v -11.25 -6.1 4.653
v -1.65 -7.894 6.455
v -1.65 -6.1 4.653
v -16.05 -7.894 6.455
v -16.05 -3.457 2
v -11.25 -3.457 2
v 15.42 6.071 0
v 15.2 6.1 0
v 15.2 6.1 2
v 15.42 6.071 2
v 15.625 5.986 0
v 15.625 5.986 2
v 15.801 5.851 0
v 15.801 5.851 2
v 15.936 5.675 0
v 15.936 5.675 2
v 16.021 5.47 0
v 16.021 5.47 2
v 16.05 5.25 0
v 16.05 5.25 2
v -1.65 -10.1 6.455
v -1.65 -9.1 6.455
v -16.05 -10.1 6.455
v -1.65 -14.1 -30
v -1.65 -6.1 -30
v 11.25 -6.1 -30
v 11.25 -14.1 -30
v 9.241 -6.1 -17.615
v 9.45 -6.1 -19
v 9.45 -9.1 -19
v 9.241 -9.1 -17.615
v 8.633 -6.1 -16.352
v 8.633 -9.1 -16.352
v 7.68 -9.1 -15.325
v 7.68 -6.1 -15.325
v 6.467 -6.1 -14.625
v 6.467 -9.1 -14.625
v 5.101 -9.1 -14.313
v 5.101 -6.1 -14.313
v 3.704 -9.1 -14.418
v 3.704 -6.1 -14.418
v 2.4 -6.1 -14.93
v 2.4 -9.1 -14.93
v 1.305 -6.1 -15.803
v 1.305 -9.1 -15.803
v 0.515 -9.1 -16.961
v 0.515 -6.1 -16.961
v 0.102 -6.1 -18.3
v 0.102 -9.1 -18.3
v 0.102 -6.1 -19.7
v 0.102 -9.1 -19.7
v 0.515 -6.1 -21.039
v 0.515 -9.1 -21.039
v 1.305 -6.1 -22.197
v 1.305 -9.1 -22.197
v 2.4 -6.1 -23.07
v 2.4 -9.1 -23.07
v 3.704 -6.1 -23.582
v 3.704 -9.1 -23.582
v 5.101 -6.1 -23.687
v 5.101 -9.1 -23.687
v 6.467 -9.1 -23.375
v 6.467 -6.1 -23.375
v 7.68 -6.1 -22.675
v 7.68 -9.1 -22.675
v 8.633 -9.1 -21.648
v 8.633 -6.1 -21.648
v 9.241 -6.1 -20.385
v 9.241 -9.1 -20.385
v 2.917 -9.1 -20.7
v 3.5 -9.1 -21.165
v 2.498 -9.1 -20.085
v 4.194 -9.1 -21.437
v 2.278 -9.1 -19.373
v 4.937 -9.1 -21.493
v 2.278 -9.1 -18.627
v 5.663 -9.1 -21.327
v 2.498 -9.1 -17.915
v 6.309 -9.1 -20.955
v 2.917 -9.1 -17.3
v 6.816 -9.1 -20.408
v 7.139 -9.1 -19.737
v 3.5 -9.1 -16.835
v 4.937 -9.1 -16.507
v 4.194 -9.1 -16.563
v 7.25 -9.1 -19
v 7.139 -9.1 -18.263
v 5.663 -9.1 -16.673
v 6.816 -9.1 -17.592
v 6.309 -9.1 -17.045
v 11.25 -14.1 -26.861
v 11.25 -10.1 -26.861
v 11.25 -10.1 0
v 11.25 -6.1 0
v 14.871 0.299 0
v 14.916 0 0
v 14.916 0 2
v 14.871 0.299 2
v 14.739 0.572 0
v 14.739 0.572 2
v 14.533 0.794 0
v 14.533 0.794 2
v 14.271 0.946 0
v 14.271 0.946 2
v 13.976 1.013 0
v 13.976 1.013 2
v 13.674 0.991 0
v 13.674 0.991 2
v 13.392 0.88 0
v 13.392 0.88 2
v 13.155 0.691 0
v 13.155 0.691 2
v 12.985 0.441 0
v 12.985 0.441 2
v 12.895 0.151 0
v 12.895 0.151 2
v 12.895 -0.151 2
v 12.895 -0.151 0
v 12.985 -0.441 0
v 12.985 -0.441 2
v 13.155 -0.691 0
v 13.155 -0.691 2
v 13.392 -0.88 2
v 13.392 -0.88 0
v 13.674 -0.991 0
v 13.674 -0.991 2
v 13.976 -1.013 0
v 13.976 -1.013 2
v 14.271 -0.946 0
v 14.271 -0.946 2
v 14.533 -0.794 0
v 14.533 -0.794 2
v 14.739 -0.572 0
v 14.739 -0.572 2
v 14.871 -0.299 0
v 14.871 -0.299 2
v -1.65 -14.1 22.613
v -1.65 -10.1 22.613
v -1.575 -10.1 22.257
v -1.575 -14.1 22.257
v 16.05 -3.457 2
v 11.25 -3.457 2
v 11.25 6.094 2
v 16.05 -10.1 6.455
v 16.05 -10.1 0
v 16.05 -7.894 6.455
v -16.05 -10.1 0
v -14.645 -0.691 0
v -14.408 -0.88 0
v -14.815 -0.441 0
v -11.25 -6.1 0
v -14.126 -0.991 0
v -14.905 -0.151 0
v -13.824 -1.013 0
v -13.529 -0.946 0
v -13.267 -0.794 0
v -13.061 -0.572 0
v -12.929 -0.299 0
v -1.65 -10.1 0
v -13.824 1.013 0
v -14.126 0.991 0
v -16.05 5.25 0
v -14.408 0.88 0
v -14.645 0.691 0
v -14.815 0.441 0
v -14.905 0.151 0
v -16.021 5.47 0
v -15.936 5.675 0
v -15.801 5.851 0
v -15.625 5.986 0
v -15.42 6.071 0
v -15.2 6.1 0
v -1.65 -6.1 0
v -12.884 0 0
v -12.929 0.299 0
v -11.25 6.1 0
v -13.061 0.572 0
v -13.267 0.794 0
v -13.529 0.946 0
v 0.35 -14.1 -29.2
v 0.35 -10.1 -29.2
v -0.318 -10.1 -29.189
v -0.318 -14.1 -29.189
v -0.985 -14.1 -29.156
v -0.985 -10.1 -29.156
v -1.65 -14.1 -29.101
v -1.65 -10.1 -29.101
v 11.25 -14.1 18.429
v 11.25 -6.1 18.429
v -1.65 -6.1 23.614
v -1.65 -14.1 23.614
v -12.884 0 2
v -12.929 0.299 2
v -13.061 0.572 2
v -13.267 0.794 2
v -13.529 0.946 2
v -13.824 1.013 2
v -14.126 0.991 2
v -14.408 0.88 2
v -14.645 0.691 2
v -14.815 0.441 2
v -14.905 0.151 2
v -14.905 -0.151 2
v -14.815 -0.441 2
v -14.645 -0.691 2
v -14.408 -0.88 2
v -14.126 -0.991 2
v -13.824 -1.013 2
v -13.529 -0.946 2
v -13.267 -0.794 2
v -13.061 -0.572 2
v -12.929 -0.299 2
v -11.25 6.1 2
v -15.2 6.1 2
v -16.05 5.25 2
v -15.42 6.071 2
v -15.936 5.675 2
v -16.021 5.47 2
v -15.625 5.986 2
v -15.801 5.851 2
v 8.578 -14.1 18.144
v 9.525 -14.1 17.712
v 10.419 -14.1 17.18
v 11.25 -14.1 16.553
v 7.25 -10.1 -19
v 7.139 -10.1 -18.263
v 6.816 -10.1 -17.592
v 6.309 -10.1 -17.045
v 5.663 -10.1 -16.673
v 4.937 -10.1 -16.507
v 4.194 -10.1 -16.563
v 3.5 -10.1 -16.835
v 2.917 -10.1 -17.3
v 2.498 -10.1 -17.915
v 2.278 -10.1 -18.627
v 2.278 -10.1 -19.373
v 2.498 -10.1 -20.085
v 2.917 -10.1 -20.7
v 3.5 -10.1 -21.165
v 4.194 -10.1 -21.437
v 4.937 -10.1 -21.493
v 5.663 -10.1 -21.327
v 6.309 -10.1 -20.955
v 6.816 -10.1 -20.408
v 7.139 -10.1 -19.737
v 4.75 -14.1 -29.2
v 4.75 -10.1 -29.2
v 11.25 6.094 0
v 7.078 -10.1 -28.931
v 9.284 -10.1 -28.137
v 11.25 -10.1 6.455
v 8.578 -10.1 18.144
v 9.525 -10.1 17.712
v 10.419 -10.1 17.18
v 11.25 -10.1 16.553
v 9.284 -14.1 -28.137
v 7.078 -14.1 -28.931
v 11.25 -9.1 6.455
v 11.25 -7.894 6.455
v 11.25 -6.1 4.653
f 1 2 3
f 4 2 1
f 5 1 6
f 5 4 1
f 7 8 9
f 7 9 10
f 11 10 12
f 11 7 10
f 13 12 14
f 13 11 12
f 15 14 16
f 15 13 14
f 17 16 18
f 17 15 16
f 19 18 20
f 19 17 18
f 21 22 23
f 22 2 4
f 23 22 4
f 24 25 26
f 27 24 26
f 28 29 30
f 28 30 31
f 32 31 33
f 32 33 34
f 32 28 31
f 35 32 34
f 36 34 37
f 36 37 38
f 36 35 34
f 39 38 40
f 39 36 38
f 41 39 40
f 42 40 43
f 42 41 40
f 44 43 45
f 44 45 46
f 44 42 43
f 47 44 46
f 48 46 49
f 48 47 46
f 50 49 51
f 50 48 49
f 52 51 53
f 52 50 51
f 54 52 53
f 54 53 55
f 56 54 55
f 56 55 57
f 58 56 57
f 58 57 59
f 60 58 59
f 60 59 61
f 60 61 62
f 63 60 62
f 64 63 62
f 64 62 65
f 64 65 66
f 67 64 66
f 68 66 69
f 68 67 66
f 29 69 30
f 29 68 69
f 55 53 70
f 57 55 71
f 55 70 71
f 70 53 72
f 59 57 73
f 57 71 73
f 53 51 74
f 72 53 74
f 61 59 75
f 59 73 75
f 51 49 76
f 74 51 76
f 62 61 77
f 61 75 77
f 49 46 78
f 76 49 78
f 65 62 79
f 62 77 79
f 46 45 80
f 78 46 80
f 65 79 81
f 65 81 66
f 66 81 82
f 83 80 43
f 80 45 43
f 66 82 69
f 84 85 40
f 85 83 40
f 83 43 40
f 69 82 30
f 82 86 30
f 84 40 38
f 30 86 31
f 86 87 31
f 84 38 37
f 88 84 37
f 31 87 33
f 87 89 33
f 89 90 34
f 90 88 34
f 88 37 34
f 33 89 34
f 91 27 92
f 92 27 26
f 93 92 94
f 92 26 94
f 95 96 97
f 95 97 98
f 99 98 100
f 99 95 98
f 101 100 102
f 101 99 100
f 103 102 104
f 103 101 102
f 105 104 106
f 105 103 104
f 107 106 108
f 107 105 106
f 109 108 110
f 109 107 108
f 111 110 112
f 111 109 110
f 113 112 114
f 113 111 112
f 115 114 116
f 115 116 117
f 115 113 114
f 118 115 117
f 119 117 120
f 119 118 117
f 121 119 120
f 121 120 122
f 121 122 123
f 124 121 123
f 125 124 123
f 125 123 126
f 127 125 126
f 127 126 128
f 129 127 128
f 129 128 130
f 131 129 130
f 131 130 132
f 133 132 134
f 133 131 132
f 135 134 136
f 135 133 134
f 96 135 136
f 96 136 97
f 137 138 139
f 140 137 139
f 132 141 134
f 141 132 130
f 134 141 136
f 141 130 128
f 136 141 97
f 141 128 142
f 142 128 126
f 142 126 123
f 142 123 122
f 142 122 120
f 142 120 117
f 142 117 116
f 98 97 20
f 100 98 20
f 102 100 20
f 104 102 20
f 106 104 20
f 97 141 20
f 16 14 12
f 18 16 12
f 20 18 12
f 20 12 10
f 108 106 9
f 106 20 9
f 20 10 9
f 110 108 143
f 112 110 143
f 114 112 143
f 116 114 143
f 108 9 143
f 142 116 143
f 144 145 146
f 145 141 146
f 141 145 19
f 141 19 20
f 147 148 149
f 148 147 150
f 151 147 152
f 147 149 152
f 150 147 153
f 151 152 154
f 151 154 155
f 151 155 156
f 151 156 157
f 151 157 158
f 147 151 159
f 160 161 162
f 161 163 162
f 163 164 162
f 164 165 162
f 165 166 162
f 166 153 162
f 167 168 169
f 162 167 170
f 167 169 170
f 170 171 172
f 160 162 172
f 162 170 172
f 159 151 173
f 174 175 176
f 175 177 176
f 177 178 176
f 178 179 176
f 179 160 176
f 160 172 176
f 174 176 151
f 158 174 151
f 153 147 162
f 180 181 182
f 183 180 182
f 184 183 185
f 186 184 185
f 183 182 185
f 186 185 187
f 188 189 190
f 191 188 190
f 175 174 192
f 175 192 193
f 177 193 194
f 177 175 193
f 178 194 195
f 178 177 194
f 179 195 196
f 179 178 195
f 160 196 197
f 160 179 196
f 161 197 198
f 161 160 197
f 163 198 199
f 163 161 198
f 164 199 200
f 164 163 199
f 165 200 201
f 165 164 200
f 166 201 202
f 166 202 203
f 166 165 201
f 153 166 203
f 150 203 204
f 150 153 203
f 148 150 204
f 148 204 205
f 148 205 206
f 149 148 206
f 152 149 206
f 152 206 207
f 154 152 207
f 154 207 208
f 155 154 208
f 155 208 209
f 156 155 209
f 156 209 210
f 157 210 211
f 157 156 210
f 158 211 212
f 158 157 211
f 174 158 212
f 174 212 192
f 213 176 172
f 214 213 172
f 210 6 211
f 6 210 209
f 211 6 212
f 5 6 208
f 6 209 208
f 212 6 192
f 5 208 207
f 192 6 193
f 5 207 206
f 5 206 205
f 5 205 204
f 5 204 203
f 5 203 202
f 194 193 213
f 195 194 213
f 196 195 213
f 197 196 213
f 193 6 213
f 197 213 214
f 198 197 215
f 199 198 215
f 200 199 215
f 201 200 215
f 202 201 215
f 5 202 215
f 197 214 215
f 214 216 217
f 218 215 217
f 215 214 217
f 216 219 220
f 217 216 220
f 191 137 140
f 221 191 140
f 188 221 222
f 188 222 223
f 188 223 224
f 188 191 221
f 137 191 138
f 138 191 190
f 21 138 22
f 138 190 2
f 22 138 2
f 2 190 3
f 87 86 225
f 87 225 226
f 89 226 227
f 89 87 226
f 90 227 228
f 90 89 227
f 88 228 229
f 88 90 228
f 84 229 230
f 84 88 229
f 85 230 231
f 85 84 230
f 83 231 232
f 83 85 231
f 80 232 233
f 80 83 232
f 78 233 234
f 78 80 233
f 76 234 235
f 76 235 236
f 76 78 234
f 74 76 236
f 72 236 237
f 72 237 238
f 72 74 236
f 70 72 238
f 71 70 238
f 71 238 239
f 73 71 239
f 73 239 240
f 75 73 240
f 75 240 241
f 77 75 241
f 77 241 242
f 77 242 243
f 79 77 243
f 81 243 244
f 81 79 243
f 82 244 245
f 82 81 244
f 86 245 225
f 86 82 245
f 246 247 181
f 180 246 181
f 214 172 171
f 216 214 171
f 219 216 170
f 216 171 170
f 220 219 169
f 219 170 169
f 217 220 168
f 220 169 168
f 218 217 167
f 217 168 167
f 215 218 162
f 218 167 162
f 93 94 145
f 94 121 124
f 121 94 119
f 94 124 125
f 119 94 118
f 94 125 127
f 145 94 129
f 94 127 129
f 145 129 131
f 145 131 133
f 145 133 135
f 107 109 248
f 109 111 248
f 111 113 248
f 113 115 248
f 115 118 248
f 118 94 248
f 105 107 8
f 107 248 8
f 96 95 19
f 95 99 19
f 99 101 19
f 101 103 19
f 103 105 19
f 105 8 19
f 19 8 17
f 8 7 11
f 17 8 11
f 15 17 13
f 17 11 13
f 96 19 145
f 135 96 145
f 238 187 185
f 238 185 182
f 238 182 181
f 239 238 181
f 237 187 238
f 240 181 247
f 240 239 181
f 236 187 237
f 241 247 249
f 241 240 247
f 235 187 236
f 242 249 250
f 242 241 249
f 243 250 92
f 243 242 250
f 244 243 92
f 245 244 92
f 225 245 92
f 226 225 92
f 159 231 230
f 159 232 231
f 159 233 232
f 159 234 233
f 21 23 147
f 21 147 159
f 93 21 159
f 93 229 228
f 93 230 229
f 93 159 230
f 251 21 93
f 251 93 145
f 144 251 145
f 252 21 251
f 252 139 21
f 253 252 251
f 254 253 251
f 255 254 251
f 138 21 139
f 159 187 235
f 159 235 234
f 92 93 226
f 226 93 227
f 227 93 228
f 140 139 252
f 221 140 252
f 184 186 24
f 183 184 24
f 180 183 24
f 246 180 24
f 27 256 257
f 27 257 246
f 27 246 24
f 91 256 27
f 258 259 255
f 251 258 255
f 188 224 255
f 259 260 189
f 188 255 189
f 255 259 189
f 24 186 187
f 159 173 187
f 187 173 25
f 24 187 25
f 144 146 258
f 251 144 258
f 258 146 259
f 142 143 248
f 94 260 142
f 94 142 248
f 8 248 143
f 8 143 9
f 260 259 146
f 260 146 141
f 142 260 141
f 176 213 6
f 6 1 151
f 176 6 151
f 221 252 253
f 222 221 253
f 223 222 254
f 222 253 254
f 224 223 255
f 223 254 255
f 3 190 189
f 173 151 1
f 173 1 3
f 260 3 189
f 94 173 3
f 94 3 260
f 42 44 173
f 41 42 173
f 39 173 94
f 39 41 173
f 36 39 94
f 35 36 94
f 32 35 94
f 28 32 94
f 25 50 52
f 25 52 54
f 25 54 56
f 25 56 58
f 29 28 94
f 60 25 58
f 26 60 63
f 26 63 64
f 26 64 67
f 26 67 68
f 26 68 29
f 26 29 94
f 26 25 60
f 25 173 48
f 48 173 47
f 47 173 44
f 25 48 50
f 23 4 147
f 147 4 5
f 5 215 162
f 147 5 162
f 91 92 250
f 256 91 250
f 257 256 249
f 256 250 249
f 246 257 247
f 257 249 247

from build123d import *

# Parameters (mm, degrees)
SKETCH1_R           = 1.016
BOSS_EXTRUDE1_DEPTH = 2
SKETCH2_R           = 4.7
BOSS_EXTRUDE2_DEPTH = 3
BOSS_EXTRUDE5_DEPTH = 8
BOSS_EXTRUDE6_START = -27.3
BOSS_EXTRUDE6_DEPTH = 32.1
SKETCH4_W           = 22.5
SKETCH4_H           = 14.127681706
CUT_EXTRUDE1_DEPTH  = 7
FILLET1_R           = 0.5
SKETCH5_R           = 2.5
BOSS_EXTRUDE7_DEPTH = 1
SKETCH6_W           = 5.313656685
SKETCH6_H           = 4.599259183
SKETCH6_W_2         = 16.163165117
SKETCH6_H_2         = 5.344557169
CUT_EXTRUDE2_DEPTH  = 5


with BuildPart() as part:
    # Sketch1 → Boss-Extrude1 (new body)
    # profile 1 of 4: a face of its own
    with BuildSketch(Plane.XY):
        with BuildLine():
            Line((-16.05, 5.25), (-16.05, -5.25))
            ThreePointArc((-16.05, -5.25), (-15.801040764, -5.851040764), (-15.2, -6.1))
            Line((-15.2, -6.1), (-11.25, -6.1))
            Line((-11.25, -6.1), (-11.25, 6.1))
            Line((-11.25, 6.1), (-15.2, 6.1))
            ThreePointArc((-15.2, 6.1), (-15.801040764, 5.851040764), (-16.05, 5.25))
        make_face()
        with Locations((-13.9, 0)):
            Circle(SKETCH1_R, mode=Mode.SUBTRACT)
    # profile 2 of 4: a face of its own
    with BuildSketch(Plane.XY):
        with BuildLine():
            Line((16.05, 5.25), (16.05, -5.25))
            ThreePointArc((16.05, -5.25), (15.801040764, -5.851040764), (15.2, -6.1))
            Line((15.2, -6.1), (11.25, -6.1))
            Line((11.25, -6.1), (11.25, 6.094097151))
            Line((11.25, 6.094097151), (15.2, 6.1))
            ThreePointArc((15.2, 6.1), (15.801040764, 5.851040764), (16.05, 5.25))
        make_face()
        with Locations((13.9, 0)):
            Circle(SKETCH1_R, mode=Mode.SUBTRACT)
    # profile 3 of 4: a face of its own
    with BuildSketch(Plane.XY):
        with BuildLine():
            ThreePointArc((15.2, -6.1), (15.801040764, -5.851040764), (16.05, -5.25))
            Line((16.05, -5.25), (16.05, -6.1))
            Line((16.05, -6.1), (15.2, -6.1))
        make_face()
    # profile 4 of 4: a face of its own
    with BuildSketch(Plane.XY):
        with BuildLine():
            ThreePointArc((-16.05, -5.25), (-15.801040764, -5.851040764), (-15.2, -6.1))
            Line((-15.2, -6.1), (-16.05, -6.1))
            Line((-16.05, -6.1), (-16.05, -5.25))
        make_face()
    extrude(amount=BOSS_EXTRUDE1_DEPTH)

    # Sketch2 → Boss-Extrude2 (add)
    with BuildSketch(Plane.XZ.offset(6.1)):
        Polygon((16.05, 2), (11.25, 2), (11.25, 18.429366849), (-1.65, 23.613902023), (-1.65, 2), (-16.05, 2), (-16.05, 0), (-1.65, 0), (-1.65, -29.999830432), (11.25, -29.999830432), (11.25, 0), (16.05, 0), align=None)
        with Locations((4.75, -19)):
            Circle(SKETCH2_R, mode=Mode.SUBTRACT)
    extrude(amount=BOSS_EXTRUDE2_DEPTH)

    # Sketch2<3> → Boss-Extrude5 (add)
    with BuildSketch(Plane.XZ.offset(6.1)):
        with BuildLine():
            ThreePointArc((8.578413339, 18.144332102), (9.979514579, 17.458386729), (11.25, 16.553139508))
            Line((11.25, 16.553139508), (11.25, 18.429366849))
            Line((11.25, 18.429366849), (-1.65, 23.613902023))
            Line((-1.65, 23.613902023), (-1.65, 22.612965014))
            Line((-1.65, 22.612965014), (-1.57491206, 22.257159966))
            Line((-1.57491206, 22.257159966), (8.578413339, 18.144332102))
        make_face()
        with BuildLine():
            ThreePointArc((0.350023778, -29.2), (-0.651218811, -29.175170712), (-1.65, -29.100743889))
            Line((-1.65, -29.100743889), (-1.65, -29.999830432))
            Line((-1.65, -29.999830432), (11.25, -29.999830432))
            Line((11.25, -29.999830432), (11.25, -26.86066155))
            ThreePointArc((11.25, -26.86066155), (8.204073841, -28.597362862), (4.75, -29.2))
            Line((4.75, -29.2), (0.350023778, -29.2))
        make_face()
    extrude(amount=BOSS_EXTRUDE5_DEPTH)

    # Sketch3 → Boss-Extrude6 (add)
    with BuildSketch(Plane(origin=(11.25, 0, 0), x_dir=(0, 0, -1), z_dir=(1, 0, 0)).offset(BOSS_EXTRUDE6_START)):
        Polygon((-7.665828596, -9.1), (-2, -3.457464127), (-2, -9.1), align=None)
    extrude(amount=BOSS_EXTRUDE6_DEPTH)

    # Sketch4 → Cut-Extrude1 (cut)
    with BuildSketch(Plane(origin=(0, -6.1, 0), x_dir=(1, 0, 0), z_dir=(0, 1, 0))):
        with Locations((0, -7.063840853)):
            Rectangle(SKETCH4_W, SKETCH4_H)
    extrude(amount=CUT_EXTRUDE1_DEPTH, mode=Mode.SUBTRACT)

    # Fillet1
    fillet1_edges = [part.edges().sort_by_distance(p)[0] for p in [
        (13.65, -9.1, 7.665828596),
        (-8.85, -9.1, 7.665828596),
    ]]
    fillet(fillet1_edges, radius=FILLET1_R)

    # Sketch5 → Boss-Extrude7 (add)
    with BuildSketch(Plane.XZ.offset(9.1)):
        with BuildLine():
            Line((-1.65, 22.612965014), (-1.65, 6.455196792))
            Line((-1.65, 6.455196792), (-16.05, 6.455196792))
            Line((-16.05, 6.455196792), (-16.05, 0))
            Line((-16.05, 0), (-1.65, 0))
            Line((-1.65, 0), (-1.65, -29.100743889))
            ThreePointArc((-1.65, -29.100743889), (-0.651218811, -29.175170712), (0.350023778, -29.2))
            Line((0.350023778, -29.2), (4.75, -29.2))
            ThreePointArc((4.75, -29.2), (8.204073841, -28.597362862), (11.25, -26.86066155))
            Line((11.25, -26.86066155), (11.25, 0))
            Line((11.25, 0), (16.05, 0))
            Line((16.05, 0), (16.05, 6.455196792))
            Line((16.05, 6.455196792), (11.25, 6.455196792))
            Line((11.25, 6.455196792), (11.25, 16.553139508))
            ThreePointArc((11.25, 16.553139508), (9.979514579, 17.458386729), (8.578413339, 18.144332102))
            Line((8.578413339, 18.144332102), (-1.57491206, 22.257159966))
            Line((-1.57491206, 22.257159966), (-1.65, 22.612965014))
        make_face()
        with Locations((4.75, -19)):
            Circle(SKETCH5_R, mode=Mode.SUBTRACT)
    extrude(amount=BOSS_EXTRUDE7_DEPTH)

    # Sketch6 → Cut-Extrude2 (cut)
    with BuildSketch(Plane.XY.offset(6.455196792)):
        with Locations((13.906828343, -7.800370409)):
            Rectangle(SKETCH6_W, SKETCH6_H)
        with Locations((-9.731582558, -7.427721416)):
            Rectangle(SKETCH6_W_2, SKETCH6_H_2)
    extrude(amount=CUT_EXTRUDE2_DEPTH, mode=Mode.SUBTRACT)


solid = part.part
